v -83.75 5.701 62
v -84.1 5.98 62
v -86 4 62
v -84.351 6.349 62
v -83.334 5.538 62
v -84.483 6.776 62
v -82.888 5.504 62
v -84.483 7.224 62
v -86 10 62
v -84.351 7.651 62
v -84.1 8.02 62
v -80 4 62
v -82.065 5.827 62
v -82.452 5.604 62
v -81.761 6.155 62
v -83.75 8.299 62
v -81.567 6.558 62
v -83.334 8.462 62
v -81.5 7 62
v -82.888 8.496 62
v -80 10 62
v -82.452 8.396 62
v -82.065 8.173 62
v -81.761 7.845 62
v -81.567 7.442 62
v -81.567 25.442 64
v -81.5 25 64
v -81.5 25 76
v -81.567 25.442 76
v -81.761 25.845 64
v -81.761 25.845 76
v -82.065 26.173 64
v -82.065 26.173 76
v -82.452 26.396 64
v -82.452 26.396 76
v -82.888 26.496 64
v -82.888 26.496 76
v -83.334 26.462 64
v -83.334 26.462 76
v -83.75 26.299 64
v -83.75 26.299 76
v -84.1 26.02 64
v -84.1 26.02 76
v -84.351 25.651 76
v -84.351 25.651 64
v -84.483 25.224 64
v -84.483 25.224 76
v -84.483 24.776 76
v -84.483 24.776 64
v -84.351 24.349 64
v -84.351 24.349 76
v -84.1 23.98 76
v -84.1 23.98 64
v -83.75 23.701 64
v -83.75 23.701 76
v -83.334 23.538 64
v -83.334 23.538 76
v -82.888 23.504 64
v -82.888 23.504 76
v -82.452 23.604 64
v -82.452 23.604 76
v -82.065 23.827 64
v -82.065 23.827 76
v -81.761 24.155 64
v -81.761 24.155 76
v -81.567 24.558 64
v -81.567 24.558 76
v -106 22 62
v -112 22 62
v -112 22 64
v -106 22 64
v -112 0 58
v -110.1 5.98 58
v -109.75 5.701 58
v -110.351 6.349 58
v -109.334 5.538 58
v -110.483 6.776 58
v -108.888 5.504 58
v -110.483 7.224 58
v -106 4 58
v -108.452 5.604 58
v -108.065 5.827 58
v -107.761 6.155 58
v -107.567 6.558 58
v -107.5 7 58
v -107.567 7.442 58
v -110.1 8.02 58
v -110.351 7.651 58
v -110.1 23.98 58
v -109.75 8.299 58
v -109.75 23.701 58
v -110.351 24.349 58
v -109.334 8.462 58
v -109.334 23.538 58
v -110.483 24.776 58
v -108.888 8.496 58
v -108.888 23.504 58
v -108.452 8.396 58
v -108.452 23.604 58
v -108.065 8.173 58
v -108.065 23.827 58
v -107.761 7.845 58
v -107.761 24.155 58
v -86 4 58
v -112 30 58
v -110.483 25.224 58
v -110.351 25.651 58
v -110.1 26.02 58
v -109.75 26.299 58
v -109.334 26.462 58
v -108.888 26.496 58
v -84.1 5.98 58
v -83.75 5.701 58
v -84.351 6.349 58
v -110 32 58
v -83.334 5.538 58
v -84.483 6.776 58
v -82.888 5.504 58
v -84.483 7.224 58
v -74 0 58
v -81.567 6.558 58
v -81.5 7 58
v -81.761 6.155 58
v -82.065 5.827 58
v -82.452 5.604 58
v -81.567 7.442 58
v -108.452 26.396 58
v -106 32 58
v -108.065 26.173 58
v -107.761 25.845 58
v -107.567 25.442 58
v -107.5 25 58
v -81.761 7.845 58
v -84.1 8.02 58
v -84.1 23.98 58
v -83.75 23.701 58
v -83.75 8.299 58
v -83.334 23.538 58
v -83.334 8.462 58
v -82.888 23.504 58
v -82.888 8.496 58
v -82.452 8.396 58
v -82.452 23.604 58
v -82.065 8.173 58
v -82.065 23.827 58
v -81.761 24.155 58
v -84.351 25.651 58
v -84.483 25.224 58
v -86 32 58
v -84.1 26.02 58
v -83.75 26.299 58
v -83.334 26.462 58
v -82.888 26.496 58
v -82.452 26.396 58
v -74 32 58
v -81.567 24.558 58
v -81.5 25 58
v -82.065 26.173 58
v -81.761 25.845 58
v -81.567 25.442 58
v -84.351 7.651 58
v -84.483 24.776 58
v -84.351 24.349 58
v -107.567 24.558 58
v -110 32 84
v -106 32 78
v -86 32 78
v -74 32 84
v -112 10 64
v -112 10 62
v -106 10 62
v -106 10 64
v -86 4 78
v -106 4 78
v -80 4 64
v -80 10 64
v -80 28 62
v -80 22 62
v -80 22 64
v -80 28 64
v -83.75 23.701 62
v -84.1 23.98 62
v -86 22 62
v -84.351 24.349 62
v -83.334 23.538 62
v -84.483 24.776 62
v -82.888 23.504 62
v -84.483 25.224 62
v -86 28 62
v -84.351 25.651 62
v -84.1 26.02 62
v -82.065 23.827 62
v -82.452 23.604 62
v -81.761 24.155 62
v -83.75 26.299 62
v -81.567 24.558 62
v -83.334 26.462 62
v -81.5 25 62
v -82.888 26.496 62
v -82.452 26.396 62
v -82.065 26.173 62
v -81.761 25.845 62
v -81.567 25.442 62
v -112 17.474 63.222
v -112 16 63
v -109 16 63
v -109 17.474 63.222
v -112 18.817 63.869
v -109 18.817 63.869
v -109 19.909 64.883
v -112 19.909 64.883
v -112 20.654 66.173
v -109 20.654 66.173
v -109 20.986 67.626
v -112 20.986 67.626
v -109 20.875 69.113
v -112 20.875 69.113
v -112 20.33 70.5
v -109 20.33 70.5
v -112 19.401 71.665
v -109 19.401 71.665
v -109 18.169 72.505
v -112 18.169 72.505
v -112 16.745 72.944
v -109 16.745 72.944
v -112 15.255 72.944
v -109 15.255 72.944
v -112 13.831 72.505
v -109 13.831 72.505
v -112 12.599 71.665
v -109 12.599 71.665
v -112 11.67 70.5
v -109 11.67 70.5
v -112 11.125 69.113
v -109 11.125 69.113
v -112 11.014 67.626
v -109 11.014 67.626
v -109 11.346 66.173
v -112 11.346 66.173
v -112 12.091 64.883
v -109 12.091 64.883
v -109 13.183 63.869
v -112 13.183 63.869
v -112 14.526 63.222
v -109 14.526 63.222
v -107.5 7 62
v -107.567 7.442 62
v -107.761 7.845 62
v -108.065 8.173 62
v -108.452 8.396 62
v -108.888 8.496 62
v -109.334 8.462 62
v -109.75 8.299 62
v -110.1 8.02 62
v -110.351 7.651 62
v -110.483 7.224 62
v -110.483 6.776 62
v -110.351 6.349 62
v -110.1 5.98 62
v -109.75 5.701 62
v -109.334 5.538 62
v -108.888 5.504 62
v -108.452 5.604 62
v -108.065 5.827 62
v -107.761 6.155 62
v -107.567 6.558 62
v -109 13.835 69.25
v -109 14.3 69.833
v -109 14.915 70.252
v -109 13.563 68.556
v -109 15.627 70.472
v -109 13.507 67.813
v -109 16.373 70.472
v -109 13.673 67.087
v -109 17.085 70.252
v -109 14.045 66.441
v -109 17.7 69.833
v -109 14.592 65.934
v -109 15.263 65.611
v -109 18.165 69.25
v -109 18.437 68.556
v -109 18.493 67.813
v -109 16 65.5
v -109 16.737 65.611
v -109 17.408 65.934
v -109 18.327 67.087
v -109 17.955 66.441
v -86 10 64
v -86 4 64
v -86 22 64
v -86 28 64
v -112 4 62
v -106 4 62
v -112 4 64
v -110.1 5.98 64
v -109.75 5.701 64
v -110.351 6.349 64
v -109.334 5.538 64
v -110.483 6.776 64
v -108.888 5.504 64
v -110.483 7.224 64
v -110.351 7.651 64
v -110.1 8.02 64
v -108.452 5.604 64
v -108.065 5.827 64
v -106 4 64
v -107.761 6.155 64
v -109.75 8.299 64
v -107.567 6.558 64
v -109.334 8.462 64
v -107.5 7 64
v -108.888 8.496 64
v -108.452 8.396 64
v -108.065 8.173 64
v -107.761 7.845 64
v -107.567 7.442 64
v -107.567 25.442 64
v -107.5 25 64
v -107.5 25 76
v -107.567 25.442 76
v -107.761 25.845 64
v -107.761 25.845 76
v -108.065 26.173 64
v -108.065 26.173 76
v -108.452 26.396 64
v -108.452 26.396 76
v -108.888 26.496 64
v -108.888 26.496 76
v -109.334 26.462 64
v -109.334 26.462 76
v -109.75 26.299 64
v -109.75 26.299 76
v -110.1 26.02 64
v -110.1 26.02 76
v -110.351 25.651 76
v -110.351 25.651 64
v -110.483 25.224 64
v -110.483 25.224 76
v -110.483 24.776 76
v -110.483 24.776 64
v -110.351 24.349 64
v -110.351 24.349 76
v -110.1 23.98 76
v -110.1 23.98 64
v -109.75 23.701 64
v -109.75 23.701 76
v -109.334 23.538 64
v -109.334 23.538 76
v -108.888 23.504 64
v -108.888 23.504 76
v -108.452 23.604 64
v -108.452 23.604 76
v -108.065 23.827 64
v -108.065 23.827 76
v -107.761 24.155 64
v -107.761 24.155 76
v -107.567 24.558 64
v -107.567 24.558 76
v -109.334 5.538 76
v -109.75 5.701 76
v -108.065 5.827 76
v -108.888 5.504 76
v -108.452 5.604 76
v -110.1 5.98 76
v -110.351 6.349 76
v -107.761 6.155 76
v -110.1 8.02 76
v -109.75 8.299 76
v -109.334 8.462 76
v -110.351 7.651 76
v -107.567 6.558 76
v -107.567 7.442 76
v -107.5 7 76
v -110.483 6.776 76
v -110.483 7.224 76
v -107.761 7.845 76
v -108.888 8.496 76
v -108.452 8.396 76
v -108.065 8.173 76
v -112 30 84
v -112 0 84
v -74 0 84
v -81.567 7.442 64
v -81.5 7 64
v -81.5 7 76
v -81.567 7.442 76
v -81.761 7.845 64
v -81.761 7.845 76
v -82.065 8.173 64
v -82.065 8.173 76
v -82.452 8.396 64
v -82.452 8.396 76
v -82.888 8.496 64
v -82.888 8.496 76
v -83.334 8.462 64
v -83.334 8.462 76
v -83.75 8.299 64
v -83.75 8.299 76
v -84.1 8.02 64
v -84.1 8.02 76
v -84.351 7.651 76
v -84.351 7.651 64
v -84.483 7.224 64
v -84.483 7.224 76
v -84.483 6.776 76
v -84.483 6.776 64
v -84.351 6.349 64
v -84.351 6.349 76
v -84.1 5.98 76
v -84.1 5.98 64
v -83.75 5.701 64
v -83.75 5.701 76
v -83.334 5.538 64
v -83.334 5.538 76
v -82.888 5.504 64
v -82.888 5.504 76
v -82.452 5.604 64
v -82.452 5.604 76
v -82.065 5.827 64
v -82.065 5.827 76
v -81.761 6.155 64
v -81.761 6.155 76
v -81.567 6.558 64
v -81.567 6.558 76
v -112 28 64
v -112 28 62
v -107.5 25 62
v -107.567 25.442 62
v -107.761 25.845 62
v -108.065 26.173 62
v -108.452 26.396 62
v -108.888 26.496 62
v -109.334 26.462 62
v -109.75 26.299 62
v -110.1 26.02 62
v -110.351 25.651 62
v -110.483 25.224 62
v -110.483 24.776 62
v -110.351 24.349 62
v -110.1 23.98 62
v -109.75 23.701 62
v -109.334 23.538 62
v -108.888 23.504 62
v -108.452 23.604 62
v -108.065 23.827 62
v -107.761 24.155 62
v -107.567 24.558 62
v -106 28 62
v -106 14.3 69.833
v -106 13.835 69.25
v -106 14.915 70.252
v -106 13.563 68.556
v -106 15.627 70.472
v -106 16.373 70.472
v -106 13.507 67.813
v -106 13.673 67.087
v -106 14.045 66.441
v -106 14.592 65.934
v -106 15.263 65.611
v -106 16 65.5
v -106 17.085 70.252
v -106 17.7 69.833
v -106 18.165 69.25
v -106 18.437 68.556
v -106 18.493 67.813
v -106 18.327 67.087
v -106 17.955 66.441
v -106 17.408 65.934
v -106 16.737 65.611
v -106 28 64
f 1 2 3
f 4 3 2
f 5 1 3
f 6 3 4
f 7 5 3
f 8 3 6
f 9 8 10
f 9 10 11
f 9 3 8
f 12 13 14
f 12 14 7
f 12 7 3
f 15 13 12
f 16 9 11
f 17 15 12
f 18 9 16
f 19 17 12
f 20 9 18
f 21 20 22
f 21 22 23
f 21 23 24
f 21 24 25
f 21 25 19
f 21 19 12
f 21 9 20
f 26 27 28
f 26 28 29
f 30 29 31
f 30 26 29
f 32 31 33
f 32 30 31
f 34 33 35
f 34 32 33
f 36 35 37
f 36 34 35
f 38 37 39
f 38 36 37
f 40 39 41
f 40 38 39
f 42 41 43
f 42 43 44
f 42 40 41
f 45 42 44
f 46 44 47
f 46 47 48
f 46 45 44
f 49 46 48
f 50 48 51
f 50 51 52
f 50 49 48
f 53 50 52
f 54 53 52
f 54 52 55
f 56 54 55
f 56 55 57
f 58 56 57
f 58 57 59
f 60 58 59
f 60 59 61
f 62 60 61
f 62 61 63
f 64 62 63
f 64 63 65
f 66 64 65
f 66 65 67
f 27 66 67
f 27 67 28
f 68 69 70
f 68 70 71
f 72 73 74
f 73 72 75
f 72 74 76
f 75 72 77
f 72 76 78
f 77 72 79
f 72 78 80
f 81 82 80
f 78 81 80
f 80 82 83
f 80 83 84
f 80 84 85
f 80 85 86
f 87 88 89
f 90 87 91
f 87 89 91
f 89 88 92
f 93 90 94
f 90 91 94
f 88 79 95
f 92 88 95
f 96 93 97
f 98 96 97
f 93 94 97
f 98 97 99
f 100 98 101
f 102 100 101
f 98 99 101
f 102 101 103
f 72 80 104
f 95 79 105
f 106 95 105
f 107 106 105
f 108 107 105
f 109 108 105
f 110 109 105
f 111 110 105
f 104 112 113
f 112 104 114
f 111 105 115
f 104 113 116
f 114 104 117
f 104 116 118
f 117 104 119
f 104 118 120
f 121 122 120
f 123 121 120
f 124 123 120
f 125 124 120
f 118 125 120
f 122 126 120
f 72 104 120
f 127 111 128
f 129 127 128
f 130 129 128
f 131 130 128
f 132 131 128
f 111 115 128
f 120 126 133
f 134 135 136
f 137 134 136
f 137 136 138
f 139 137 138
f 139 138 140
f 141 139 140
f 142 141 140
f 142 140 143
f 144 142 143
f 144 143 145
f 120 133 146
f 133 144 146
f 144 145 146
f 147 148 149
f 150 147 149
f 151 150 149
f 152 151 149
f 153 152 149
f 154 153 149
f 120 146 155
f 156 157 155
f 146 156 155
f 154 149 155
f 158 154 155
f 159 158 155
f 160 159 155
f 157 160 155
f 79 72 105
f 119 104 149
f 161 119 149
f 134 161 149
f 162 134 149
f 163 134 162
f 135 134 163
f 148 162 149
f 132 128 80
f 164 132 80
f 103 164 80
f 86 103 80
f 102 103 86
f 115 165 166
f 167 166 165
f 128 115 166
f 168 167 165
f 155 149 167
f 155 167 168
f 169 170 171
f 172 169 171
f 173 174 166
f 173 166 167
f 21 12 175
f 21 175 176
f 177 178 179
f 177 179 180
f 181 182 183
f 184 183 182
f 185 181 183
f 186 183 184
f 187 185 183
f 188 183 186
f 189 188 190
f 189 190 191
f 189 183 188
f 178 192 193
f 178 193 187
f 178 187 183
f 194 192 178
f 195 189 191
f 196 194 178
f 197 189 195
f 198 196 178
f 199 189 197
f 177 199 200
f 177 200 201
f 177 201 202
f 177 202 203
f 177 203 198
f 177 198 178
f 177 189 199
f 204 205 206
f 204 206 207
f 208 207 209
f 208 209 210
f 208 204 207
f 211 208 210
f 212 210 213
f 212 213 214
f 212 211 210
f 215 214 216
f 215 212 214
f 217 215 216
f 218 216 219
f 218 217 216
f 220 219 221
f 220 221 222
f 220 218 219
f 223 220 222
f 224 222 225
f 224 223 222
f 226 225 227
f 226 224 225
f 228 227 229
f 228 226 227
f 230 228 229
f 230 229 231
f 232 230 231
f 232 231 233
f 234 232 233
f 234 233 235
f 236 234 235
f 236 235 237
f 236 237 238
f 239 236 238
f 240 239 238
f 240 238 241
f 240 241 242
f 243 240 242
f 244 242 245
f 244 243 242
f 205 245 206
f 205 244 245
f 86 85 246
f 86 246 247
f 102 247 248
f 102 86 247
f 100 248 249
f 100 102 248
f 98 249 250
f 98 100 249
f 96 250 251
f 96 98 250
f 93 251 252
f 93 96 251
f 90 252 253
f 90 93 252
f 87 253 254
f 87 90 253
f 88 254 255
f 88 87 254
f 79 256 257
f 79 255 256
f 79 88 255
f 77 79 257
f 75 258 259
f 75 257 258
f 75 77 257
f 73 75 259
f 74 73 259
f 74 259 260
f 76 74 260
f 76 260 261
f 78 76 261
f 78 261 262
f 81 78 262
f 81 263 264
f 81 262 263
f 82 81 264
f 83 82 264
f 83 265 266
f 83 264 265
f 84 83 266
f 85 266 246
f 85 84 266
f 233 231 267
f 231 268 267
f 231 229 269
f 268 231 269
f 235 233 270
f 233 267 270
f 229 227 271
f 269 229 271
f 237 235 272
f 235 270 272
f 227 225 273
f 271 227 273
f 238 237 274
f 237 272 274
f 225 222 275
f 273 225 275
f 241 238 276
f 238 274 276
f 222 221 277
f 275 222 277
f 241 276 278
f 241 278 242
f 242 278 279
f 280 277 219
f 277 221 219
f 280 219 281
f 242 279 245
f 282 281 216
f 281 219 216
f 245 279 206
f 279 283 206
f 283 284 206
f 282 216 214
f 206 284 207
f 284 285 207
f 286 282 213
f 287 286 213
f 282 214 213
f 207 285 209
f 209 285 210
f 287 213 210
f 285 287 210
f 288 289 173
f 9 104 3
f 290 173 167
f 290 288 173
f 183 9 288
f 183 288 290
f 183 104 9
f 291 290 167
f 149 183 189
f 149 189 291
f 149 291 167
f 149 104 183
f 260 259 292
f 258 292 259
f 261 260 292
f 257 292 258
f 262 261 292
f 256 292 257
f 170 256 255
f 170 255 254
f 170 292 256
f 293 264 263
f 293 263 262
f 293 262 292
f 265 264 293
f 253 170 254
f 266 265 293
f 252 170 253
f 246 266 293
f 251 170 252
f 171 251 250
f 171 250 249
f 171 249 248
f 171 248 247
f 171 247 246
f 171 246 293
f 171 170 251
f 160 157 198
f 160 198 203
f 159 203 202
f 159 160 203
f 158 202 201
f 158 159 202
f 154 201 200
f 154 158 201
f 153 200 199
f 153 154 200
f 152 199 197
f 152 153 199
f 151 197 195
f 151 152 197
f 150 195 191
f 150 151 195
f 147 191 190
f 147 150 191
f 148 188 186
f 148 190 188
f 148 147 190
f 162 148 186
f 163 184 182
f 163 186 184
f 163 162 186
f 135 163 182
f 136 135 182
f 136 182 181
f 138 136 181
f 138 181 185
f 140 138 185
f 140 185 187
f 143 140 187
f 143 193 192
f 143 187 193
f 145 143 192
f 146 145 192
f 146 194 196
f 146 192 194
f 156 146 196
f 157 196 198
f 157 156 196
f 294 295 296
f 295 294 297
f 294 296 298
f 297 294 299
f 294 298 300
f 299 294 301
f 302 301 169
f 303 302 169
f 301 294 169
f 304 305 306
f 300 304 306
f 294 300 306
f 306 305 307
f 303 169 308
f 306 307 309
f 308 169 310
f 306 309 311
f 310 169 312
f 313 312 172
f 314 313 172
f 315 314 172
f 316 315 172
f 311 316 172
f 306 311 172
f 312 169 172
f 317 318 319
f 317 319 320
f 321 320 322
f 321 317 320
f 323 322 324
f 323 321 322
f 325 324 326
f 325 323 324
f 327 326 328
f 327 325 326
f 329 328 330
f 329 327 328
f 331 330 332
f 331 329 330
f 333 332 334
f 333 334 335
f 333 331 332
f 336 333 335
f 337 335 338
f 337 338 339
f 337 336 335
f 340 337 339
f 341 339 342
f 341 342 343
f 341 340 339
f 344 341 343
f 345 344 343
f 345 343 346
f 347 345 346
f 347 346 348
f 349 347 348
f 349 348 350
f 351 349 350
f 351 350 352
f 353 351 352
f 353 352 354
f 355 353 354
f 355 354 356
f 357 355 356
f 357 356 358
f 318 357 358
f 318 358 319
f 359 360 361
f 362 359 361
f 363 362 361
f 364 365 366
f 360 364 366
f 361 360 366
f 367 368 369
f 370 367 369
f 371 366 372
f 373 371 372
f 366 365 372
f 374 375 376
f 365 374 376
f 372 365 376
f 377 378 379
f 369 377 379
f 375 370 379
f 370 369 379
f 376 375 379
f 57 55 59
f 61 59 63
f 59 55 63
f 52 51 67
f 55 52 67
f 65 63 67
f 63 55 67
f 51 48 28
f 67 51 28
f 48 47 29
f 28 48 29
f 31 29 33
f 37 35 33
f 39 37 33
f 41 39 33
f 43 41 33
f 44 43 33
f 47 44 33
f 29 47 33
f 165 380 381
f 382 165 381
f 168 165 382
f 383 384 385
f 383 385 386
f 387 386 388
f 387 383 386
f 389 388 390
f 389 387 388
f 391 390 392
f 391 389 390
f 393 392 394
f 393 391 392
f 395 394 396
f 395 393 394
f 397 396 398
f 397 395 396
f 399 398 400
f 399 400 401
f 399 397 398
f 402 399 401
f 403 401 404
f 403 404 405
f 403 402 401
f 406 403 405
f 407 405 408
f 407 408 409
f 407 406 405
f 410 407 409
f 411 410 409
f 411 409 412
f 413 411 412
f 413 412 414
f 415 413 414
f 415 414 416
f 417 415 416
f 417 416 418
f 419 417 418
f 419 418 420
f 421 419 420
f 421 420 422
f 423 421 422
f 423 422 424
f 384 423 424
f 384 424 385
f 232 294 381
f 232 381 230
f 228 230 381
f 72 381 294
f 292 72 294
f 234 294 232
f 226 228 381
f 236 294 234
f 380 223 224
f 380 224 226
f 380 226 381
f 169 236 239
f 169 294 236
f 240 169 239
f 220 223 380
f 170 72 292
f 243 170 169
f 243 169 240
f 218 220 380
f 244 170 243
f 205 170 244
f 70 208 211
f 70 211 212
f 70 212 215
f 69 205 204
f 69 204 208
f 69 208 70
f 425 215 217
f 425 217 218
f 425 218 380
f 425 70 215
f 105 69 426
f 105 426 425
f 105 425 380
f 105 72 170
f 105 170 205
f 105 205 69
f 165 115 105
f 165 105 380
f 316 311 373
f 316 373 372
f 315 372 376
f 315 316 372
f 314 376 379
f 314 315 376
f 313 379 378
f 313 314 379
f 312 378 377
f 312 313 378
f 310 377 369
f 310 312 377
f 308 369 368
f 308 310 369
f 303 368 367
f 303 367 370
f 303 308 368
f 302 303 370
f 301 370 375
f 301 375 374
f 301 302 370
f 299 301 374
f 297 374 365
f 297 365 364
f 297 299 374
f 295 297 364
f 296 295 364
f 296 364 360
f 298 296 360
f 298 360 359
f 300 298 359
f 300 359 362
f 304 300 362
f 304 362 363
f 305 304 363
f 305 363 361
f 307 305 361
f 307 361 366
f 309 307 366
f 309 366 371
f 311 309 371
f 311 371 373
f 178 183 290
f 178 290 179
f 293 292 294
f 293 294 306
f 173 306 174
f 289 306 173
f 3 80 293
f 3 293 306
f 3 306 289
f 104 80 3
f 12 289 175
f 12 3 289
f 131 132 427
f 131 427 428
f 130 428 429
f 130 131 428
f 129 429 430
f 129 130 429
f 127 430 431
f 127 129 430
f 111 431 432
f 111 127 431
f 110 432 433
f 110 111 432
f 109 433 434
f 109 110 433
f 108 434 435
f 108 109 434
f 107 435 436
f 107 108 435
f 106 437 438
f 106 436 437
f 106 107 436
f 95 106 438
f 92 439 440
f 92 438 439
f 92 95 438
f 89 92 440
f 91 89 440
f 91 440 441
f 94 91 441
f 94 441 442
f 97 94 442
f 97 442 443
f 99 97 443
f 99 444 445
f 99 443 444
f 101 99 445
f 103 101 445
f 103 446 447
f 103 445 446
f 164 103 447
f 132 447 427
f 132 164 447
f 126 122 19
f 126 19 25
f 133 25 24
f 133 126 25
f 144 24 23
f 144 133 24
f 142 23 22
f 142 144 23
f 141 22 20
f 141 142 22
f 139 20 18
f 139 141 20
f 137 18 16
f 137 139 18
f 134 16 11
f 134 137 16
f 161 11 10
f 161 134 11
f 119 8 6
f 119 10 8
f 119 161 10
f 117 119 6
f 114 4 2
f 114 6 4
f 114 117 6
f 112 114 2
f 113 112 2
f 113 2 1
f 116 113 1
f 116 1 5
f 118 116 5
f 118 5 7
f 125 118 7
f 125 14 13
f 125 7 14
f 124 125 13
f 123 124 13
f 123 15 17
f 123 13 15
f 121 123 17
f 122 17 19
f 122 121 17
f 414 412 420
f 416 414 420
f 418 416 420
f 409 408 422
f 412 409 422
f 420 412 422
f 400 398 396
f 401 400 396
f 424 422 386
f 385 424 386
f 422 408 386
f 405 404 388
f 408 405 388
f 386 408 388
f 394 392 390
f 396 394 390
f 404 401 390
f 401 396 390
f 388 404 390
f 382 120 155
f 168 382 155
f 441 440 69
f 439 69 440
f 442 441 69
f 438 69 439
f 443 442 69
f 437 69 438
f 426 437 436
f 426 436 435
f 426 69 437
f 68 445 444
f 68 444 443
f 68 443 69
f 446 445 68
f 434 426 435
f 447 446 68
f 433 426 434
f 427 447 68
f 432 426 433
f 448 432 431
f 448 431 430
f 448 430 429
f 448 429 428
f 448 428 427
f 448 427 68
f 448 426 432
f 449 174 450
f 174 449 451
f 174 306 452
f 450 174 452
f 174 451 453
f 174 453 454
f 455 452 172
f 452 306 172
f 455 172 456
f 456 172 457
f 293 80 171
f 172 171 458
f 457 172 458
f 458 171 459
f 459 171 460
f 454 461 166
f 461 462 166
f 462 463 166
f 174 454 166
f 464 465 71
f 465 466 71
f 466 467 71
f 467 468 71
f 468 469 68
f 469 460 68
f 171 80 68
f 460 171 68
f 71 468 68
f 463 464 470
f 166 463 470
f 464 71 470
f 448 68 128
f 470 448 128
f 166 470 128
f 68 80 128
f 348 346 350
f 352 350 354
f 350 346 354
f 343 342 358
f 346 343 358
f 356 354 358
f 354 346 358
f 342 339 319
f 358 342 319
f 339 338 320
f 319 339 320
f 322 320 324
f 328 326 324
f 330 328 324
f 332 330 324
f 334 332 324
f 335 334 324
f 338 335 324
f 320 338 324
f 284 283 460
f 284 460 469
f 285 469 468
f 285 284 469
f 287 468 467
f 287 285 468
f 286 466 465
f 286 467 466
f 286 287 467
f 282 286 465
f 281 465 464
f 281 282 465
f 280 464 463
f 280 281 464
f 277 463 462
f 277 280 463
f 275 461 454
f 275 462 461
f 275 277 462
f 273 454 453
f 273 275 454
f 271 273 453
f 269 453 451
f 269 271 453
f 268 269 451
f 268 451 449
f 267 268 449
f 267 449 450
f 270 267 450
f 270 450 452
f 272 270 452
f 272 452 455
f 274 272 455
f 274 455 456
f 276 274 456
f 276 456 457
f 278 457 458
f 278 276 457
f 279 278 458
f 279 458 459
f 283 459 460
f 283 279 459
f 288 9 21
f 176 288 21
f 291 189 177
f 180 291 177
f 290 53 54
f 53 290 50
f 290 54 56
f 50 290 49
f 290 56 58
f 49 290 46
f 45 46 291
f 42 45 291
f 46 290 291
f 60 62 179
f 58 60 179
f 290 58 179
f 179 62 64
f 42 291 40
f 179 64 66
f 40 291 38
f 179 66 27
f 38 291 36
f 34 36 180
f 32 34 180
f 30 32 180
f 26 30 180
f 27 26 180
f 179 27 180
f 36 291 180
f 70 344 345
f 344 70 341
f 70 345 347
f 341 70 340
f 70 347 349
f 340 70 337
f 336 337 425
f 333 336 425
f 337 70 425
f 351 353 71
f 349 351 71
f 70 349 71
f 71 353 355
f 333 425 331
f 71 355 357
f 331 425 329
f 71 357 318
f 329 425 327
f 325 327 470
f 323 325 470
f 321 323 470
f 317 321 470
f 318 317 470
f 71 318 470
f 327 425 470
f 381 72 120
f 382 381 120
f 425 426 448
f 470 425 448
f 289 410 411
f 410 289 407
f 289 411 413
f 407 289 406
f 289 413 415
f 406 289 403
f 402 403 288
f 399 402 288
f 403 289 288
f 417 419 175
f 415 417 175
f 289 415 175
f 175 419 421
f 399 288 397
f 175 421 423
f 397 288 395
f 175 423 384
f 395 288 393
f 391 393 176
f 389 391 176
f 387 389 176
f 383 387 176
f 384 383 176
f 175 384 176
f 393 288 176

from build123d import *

# Parameters (mm, degrees)
CYLINDER1785_R     = 5
CYLINDER1785_DEPTH = 3
CYLINDER1786_R     = 2.5
CYLINDER1786_DEPTH = 20
CYLINDER1781_R     = 1.5
CYLINDER1781_DEPTH = 20
CYLINDER1783_R     = 1.5
CYLINDER1783_DEPTH = 20
CYLINDER1784_R     = 1.5
CYLINDER1784_DEPTH = 20
CYLINDER1782_R     = 1.5
CYLINDER1782_DEPTH = 20
BOX744_W           = 6
BOX744_H           = 6
BOX744_DEPTH       = 2
BOX746_W           = 6
BOX746_H           = 6
BOX746_DEPTH       = 2
BOX745_W           = 6
BOX745_H           = 6
BOX745_DEPTH       = 2
BOX742_W           = 6
BOX742_H           = 6
BOX742_DEPTH       = 2
BOX743_W           = 20
BOX743_H           = 80
BOX743_DEPTH       = 20
BOX747_W           = 38
BOX747_H           = 32
BOX747_DEPTH       = 26
CHAMFER060_SIZE    = 2


with BuildPart() as v_lec1785:
    # Cylinder1785 → Cylinder1785 (new body)
    with BuildSketch(Plane(origin=(-112, 16, 66), x_dir=(0, 0, -1), z_dir=(1, 0, 0))):
        Circle(CYLINDER1785_R)
    extrude(amount=CYLINDER1785_DEPTH)


with BuildPart() as v_lec1786:
    # Cylinder1786 → Cylinder1786 (new body)
    with BuildSketch(Plane(origin=(-117, 16, 66), x_dir=(0, 0, -1), z_dir=(1, 0, 0))):
        Circle(CYLINDER1786_R)
    extrude(amount=CYLINDER1786_DEPTH)


with BuildPart() as v_lec1781:
    # Cylinder1781 → Cylinder1781 (new body)
    with BuildSketch(Plane(origin=(-83, 25, 54), x_dir=(1, 0, 0), z_dir=(0, 0, 1))):
        Circle(CYLINDER1781_R)
    extrude(amount=CYLINDER1781_DEPTH)


with BuildPart() as v_lec1783:
    # Cylinder1783 → Cylinder1783 (new body)
    with BuildSketch(Plane(origin=(-109, 7, 54), x_dir=(1, 0, 0), z_dir=(0, 0, 1))):
        Circle(CYLINDER1783_R)
    extrude(amount=CYLINDER1783_DEPTH)


with BuildPart() as v_lec1784:
    # Cylinder1784 → Cylinder1784 (new body)
    with BuildSketch(Plane(origin=(-109, 25, 54), x_dir=(1, 0, 0), z_dir=(0, 0, 1))):
        Circle(CYLINDER1784_R)
    extrude(amount=CYLINDER1784_DEPTH)


with BuildPart() as compound913:
    # Cylinder1782 → Cylinder1782 (new body)
    with BuildSketch(Plane(origin=(-83, 7, 54), x_dir=(1, 0, 0), z_dir=(0, 0, 1))):
        Circle(CYLINDER1782_R)
    extrude(amount=CYLINDER1782_DEPTH)

    # Compound913: union Válec1781, Válec1783, Válec1784
    add(v_lec1781.part)
    add(v_lec1783.part)
    add(v_lec1784.part)


with BuildPart() as krychle744:
    # Box744 → Box744 (new body)
    with BuildSketch(Plane(origin=(-112, 22, 60), x_dir=(1, 0, 0), z_dir=(0, 0, 1))):
        with Locations((3, 3)):
            Rectangle(BOX744_W, BOX744_H)
    extrude(amount=BOX744_DEPTH)


with BuildPart() as krychle746:
    # Box746 → Box746 (new body)
    with BuildSketch(Plane(origin=(-86, 4, 60), x_dir=(1, 0, 0), z_dir=(0, 0, 1))):
        with Locations((3, 3)):
            Rectangle(BOX746_W, BOX746_H)
    extrude(amount=BOX746_DEPTH)


with BuildPart() as krychle745:
    # Box745 → Box745 (new body)
    with BuildSketch(Plane(origin=(-86, 22, 60), x_dir=(1, 0, 0), z_dir=(0, 0, 1))):
        with Locations((3, 3)):
            Rectangle(BOX745_W, BOX745_H)
    extrude(amount=BOX745_DEPTH)


with BuildPart() as compound912:
    # Box742 → Box742 (new body)
    with BuildSketch(Plane(origin=(-112, 4, 60), x_dir=(1, 0, 0), z_dir=(0, 0, 1))):
        with Locations((3, 3)):
            Rectangle(BOX742_W, BOX742_H)
    extrude(amount=BOX742_DEPTH)

    # Compound912: union Krychle744, Krychle746, Krychle745
    add(krychle744.part)
    add(krychle746.part)
    add(krychle745.part)


with BuildPart() as krychle743:
    # Box743 → Box743 (new body)
    with BuildSketch(Plane(origin=(-106, 4, 56), x_dir=(1, 0, 0), z_dir=(0, 0, 1))):
        with Locations((10, 40)):
            Rectangle(BOX743_W, BOX743_H)
    extrude(amount=BOX743_DEPTH)


with BuildPart() as chamfer060:
    # Box747 → Box747 (new body)
    with BuildSketch(Plane(origin=(-112, 0, 56), x_dir=(1, 0, 0), z_dir=(0, 0, 1))):
        with Locations((19, 16)):
            Rectangle(BOX747_W, BOX747_H)
    extrude(amount=BOX747_DEPTH)

    # Cut546: cut Krychle743
    add(krychle743.part, mode=Mode.SUBTRACT)

    # Cut547: cut Compound912
    add(compound912.part, mode=Mode.SUBTRACT)

    # Cut541: cut Compound913
    add(compound913.part, mode=Mode.SUBTRACT)

    # Cut542: cut Válec1786
    add(v_lec1786.part, mode=Mode.SUBTRACT)

    # Cut543: cut Válec1785
    add(v_lec1785.part, mode=Mode.SUBTRACT)

    # Chamfer060
    chamfer060_edges = [chamfer060.edges().sort_by_distance(p)[0] for p in [
        (-112, 32, 69),
    ]]
    chamfer(chamfer060_edges, length=CHAMFER060_SIZE)


with BuildPart() as chamfer060_1:
    # Chamfer060 placement: moved
    add(chamfer060.part.moved(Location((0, 0, 2))))


solid = chamfer060_1.part
